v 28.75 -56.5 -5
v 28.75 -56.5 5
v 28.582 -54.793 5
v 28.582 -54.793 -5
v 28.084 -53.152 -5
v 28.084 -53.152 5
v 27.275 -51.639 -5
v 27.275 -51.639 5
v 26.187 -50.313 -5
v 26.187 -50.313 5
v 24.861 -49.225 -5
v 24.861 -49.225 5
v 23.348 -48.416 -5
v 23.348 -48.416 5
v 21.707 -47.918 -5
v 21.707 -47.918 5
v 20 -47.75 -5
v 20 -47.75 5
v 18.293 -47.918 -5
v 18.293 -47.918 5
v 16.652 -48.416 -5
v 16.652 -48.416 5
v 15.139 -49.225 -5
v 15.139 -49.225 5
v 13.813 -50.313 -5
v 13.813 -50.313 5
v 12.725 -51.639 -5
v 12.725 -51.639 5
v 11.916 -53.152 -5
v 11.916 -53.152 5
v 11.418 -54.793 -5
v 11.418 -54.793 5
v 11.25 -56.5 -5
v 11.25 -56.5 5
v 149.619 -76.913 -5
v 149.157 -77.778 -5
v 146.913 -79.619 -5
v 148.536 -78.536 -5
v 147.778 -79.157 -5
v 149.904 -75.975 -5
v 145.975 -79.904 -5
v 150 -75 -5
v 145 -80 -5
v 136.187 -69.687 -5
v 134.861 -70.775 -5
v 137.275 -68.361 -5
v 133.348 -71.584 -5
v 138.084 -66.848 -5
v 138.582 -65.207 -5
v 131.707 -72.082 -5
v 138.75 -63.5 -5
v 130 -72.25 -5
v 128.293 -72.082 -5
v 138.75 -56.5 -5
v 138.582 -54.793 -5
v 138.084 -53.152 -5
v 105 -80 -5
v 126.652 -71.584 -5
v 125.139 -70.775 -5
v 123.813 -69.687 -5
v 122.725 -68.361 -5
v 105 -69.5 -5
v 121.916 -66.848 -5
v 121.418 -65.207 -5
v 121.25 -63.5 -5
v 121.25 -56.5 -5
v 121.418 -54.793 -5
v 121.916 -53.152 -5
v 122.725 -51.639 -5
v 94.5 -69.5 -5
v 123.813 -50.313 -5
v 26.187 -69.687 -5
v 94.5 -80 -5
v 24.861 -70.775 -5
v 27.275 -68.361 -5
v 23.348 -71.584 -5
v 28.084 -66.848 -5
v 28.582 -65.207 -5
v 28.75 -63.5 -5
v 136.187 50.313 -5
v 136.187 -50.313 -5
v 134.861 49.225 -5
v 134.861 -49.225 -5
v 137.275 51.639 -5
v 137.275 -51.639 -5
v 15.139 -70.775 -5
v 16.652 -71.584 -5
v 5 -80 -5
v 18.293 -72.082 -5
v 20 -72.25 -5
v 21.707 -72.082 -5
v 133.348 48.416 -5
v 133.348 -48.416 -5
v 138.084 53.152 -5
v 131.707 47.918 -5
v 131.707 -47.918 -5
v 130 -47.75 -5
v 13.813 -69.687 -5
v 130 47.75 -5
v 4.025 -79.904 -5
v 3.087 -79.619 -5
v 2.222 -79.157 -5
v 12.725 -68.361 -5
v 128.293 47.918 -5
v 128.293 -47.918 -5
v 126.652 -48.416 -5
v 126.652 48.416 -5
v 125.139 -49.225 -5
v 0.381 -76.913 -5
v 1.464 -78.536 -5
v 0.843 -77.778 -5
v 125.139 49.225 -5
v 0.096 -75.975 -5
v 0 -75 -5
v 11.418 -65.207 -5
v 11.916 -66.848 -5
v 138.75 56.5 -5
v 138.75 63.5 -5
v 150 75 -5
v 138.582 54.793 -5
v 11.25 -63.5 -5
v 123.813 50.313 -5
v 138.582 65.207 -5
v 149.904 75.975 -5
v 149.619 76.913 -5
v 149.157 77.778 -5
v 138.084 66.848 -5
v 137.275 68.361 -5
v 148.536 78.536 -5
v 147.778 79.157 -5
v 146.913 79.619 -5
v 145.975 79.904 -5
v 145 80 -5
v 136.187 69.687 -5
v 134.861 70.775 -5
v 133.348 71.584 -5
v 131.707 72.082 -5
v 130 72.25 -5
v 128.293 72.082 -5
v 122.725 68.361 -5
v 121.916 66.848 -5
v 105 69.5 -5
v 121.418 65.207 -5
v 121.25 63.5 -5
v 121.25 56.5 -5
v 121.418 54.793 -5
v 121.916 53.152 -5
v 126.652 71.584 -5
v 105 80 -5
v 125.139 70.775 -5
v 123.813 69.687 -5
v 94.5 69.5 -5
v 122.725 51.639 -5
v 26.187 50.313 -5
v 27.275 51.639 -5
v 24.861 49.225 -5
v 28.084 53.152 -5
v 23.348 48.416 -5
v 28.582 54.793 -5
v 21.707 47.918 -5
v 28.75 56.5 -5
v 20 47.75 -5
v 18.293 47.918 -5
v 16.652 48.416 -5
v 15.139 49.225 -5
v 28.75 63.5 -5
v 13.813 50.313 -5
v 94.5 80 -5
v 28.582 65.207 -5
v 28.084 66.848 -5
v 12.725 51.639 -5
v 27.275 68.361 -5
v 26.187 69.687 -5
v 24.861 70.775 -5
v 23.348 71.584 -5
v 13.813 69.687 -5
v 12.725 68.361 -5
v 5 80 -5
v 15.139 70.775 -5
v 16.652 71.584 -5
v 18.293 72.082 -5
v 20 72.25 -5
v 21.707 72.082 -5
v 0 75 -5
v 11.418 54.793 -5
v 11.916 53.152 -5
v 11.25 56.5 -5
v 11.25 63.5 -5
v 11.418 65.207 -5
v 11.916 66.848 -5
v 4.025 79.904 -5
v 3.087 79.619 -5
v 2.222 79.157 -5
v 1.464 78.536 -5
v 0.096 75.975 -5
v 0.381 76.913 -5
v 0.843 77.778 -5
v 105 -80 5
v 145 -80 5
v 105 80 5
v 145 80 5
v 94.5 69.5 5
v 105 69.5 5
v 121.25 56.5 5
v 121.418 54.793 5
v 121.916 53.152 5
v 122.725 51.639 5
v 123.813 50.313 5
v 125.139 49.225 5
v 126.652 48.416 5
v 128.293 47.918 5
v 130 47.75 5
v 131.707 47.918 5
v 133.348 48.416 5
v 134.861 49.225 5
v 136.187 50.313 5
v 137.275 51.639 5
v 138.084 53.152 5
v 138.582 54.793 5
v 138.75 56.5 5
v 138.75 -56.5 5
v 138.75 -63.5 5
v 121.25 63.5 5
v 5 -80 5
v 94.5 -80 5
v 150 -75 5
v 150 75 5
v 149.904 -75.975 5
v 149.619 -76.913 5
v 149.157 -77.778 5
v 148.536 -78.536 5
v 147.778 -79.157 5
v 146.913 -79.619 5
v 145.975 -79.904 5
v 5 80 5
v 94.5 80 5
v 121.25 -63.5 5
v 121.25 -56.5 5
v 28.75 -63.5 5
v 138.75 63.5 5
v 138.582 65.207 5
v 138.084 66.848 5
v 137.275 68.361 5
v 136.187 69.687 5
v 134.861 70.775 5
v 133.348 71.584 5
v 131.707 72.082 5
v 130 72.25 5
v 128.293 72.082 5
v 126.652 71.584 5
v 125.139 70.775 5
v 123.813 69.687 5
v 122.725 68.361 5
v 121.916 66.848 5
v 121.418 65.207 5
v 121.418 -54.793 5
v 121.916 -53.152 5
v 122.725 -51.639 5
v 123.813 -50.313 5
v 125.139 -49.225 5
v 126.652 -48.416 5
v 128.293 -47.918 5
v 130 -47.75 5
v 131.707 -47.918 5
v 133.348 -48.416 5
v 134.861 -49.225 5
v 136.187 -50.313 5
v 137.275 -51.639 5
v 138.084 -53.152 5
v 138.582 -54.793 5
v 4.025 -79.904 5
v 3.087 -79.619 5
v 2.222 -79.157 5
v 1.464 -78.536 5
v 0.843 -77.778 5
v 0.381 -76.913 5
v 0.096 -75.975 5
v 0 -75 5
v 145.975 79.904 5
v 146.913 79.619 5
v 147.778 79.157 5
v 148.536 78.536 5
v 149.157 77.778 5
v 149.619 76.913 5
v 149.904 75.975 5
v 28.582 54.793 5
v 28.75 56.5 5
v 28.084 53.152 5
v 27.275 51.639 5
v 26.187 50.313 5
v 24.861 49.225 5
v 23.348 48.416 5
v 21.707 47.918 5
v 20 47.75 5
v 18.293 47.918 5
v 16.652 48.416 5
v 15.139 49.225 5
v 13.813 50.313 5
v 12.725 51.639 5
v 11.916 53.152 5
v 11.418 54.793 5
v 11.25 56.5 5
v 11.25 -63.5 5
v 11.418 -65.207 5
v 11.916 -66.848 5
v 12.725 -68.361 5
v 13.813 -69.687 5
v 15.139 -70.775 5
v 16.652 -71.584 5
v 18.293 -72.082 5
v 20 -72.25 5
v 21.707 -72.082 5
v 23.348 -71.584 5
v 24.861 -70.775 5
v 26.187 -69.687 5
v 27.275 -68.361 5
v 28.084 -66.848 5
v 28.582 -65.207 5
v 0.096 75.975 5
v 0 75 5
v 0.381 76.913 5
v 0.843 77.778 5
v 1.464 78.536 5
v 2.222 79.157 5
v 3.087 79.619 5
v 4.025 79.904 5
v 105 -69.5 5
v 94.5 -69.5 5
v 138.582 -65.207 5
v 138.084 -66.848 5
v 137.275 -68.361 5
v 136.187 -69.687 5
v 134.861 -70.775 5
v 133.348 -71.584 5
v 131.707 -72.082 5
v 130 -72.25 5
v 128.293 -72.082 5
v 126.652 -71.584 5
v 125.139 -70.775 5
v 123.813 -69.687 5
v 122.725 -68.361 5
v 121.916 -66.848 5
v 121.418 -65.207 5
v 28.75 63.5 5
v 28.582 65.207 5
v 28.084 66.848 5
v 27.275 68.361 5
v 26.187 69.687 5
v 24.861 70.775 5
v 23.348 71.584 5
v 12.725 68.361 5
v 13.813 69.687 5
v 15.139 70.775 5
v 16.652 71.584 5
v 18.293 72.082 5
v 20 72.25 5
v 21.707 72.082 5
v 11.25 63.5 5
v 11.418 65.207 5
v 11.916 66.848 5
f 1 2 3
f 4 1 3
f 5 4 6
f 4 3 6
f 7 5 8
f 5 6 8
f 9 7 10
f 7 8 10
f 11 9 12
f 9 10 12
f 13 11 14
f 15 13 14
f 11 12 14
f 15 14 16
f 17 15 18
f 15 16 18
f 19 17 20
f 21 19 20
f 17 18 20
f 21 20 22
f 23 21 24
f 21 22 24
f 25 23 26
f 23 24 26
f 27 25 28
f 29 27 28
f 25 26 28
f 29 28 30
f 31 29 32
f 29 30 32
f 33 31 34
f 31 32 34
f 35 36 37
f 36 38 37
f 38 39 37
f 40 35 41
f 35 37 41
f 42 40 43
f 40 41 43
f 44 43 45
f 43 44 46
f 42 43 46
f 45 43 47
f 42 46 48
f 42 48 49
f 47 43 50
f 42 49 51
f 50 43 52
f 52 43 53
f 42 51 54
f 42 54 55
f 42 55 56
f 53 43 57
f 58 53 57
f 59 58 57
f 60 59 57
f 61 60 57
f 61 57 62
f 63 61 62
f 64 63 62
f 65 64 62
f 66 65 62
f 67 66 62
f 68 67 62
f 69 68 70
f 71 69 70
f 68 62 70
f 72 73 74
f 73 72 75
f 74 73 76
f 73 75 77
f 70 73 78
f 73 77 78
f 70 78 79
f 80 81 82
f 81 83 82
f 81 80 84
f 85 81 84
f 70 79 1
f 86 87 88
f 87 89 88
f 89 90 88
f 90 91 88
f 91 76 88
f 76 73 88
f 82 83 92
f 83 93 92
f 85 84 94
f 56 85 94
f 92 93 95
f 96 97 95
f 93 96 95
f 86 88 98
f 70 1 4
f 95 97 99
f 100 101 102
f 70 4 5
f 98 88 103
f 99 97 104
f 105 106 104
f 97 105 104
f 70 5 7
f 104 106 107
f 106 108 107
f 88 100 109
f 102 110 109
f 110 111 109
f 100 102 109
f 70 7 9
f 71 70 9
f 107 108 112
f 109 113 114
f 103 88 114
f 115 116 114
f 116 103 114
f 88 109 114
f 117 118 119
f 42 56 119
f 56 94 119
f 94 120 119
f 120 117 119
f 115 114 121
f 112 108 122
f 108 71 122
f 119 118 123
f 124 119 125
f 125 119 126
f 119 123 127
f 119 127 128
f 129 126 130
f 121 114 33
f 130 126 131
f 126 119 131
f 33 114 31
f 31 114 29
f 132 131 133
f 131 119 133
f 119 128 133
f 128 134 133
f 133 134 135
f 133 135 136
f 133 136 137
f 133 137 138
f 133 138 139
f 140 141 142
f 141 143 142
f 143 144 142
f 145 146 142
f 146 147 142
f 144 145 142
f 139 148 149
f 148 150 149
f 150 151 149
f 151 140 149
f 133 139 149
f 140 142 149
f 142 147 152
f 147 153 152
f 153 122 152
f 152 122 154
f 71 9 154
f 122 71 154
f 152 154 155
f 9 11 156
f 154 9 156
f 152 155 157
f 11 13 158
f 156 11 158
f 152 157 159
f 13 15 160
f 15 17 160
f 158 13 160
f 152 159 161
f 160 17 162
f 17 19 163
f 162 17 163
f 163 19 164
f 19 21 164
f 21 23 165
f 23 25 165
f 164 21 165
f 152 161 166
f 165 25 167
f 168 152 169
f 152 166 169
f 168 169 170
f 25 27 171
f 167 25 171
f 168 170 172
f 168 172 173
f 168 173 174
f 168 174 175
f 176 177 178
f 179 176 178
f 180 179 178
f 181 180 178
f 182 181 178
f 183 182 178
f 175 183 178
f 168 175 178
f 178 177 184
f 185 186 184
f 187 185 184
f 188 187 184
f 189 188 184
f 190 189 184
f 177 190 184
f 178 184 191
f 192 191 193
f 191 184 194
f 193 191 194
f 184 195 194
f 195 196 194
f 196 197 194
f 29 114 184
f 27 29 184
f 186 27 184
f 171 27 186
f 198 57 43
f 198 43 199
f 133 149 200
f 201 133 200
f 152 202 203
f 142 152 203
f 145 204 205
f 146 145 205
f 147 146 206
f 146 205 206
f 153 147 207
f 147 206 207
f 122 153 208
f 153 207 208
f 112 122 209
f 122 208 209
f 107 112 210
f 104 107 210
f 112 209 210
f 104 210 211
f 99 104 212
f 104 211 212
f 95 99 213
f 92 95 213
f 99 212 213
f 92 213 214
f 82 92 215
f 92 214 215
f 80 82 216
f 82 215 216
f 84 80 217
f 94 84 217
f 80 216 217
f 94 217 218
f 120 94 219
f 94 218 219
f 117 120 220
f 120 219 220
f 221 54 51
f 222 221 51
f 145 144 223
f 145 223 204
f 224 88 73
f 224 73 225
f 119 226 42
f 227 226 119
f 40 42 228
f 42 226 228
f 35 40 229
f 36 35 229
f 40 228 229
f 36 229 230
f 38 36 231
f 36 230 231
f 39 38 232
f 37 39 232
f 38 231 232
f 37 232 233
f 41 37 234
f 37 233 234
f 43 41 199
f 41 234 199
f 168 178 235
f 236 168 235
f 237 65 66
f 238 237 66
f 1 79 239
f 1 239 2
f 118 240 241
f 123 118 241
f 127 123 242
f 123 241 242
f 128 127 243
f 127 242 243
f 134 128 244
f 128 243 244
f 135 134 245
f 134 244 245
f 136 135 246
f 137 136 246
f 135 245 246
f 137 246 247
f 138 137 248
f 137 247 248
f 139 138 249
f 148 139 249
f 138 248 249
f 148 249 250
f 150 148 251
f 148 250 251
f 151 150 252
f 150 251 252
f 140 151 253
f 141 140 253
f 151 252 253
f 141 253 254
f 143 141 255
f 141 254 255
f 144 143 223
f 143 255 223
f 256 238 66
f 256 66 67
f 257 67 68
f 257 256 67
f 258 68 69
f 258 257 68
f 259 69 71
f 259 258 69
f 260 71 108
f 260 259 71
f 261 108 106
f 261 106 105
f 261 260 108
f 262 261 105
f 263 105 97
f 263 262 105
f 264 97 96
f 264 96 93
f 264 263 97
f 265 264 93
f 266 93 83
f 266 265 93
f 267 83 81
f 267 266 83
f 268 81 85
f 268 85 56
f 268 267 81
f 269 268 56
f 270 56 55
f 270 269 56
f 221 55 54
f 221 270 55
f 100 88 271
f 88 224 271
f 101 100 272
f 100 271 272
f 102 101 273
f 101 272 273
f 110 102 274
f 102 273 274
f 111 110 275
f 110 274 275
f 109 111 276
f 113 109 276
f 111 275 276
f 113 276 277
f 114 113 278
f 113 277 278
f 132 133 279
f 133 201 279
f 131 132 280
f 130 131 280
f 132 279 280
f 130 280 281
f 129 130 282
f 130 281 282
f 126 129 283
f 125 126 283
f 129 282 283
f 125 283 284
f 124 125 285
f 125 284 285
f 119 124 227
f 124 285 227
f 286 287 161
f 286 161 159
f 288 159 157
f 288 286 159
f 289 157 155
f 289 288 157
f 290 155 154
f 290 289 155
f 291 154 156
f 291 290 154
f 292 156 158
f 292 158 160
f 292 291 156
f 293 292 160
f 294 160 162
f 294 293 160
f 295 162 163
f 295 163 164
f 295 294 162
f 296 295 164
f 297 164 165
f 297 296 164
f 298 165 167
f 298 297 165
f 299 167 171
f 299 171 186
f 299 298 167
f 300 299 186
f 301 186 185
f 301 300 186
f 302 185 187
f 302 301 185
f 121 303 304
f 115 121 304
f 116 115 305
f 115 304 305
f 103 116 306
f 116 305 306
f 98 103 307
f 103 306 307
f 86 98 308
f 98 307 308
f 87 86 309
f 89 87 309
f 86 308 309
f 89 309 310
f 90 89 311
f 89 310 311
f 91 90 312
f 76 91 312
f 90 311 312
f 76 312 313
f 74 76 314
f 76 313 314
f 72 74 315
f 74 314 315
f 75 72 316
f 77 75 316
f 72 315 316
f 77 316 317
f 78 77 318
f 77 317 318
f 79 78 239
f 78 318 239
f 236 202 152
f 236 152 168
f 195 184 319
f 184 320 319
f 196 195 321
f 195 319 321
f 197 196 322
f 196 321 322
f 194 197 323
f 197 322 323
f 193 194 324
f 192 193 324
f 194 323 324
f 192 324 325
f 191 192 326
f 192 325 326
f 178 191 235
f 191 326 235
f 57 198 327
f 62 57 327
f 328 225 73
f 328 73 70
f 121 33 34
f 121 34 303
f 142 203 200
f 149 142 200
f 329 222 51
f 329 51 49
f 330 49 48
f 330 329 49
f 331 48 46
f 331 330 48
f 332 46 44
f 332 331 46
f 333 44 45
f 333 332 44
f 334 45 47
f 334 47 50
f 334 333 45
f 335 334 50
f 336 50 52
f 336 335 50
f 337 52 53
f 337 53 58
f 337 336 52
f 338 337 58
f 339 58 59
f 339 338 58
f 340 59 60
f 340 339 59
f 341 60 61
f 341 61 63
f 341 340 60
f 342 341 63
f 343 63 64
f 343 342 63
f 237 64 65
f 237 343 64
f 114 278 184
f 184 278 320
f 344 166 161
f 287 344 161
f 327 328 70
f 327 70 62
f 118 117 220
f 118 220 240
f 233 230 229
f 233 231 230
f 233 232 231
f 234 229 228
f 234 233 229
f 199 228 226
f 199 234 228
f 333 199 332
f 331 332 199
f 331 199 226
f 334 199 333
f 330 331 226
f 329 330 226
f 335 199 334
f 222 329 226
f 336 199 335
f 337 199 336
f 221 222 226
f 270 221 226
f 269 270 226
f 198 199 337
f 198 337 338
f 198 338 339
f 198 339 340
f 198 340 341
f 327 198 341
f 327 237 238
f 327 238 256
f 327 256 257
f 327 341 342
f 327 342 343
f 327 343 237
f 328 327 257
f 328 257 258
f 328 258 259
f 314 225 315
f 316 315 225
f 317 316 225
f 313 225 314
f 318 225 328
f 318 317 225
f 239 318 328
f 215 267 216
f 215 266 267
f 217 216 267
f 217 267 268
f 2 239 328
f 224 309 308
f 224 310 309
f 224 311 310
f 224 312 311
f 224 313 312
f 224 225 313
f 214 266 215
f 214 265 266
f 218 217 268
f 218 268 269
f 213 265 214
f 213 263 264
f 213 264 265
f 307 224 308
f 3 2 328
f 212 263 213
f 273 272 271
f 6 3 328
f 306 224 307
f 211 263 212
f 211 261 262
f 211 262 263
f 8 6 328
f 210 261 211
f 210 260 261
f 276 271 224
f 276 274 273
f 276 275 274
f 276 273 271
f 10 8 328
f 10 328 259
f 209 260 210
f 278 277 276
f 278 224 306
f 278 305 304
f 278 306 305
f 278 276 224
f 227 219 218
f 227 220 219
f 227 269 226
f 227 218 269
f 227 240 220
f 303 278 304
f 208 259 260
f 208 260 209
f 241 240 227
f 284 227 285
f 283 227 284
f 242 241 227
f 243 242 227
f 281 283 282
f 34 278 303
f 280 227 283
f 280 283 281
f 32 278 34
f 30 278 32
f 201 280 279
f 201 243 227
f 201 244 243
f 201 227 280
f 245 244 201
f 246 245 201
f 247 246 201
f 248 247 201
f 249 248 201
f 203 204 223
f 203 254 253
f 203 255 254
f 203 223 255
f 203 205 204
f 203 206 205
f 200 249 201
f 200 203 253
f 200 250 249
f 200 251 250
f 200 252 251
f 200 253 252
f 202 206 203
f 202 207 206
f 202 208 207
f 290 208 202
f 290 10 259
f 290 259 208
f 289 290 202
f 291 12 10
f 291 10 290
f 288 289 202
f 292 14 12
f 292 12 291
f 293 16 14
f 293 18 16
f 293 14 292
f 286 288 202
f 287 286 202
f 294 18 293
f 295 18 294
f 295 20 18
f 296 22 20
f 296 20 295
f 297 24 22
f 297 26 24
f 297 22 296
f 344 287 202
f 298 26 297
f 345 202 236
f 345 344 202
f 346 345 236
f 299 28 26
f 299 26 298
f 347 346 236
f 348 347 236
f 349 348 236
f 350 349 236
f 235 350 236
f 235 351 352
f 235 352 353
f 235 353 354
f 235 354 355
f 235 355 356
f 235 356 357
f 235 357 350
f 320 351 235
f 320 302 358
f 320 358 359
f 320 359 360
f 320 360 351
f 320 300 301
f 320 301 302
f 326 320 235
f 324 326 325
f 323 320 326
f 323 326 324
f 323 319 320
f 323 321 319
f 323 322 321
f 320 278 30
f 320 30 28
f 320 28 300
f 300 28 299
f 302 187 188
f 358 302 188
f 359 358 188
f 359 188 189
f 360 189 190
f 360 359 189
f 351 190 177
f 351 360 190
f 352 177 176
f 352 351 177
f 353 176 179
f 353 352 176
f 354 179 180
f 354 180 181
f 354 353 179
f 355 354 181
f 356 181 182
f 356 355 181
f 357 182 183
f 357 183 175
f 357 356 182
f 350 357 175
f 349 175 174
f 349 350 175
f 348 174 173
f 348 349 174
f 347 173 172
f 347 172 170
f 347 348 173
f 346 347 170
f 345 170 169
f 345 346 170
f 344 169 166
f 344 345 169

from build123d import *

# Parameters (mm, degrees)
PLAT_W                      = 160
PLAT_H                      = 10
EL_MENT_M_CANO_SOUD_1_DEPTH = 150
D_GAGEMENT_M161_D           = 17.5
D_GAGEMENT_M161_DEPTH       = 10
D_GAGEMENT_M161_TIP         = 5.257530416
ESQUISSE4_W                 = 10.5
ESQUISSE4_H                 = 10.5
ENL_V_MAT_EXTRU_1_DEPTH     = 11
CONG_1_R                    = 5
ENL_V_MAT_EXTRU_2_DEPTH     = 10


with BuildPart() as part:
    # plat → Elément mécano-soudé1 (new body)
    with BuildSketch(Plane.YZ):
        Rectangle(PLAT_W, PLAT_H)
    extrude(amount=EL_MENT_M_CANO_SOUD_1_DEPTH)

    # Dégagement M161
    with Locations(Plane.XY.offset(5)):
        with Locations((130, -60), (130, 60), (20, 60), (20, -60)):
            Hole(D_GAGEMENT_M161_D / 2, depth=D_GAGEMENT_M161_DEPTH)
            with Locations((0, 0, -(D_GAGEMENT_M161_DEPTH + D_GAGEMENT_M161_TIP / 2))):  # 118° drill point
                Cone(0, D_GAGEMENT_M161_D / 2, D_GAGEMENT_M161_TIP, mode=Mode.SUBTRACT)

    # Esquisse4 → Enlèv. mat.-Extru.1 (cut, through all)
    with BuildSketch(Plane.XY.offset(5)):
        with Locations((99.75, 74.75)):
            Rectangle(ESQUISSE4_W, ESQUISSE4_H)
        with Locations((99.75, -74.75)):
            Rectangle(ESQUISSE4_W, ESQUISSE4_H)
    extrude(amount=-ENL_V_MAT_EXTRU_1_DEPTH, mode=Mode.SUBTRACT)

    # Congé1
    cong_1_edges = [part.edges().sort_by_distance(p)[0] for p in [
        (150, 80, 0),
        (150, -80, 0),
        (0, 80, 0),
        (0, -80, 0),
    ]]
    fillet(cong_1_edges, radius=CONG_1_R)

    # Esquisse5 → Enlèv. mat.-Extru.2 (cut)
    with BuildSketch(Plane.XY.offset(5)):
        with BuildLine():
            Line((11.25, 56.5), (11.25, 63.5))
            ThreePointArc((11.25, 63.5), (20, 72.25), (28.75, 63.5))
            Line((28.75, 63.5), (28.75, 56.5))
            ThreePointArc((28.75, 56.5), (20, 47.75), (11.25, 56.5))
        make_face()
        with BuildLine():
            Line((138.75, 56.5), (138.75, 63.5))
            ThreePointArc((138.75, 63.5), (130, 72.25), (121.25, 63.5))
            Line((121.25, 63.5), (121.25, 56.5))
            ThreePointArc((121.25, 56.5), (130, 47.75), (138.75, 56.5))
        make_face()
        with BuildLine():
            Line((138.75, -56.5), (138.75, -63.5))
            ThreePointArc((138.75, -63.5), (130, -72.25), (121.25, -63.5))
            Line((121.25, -63.5), (121.25, -56.5))
            ThreePointArc((121.25, -56.5), (130, -47.75), (138.75, -56.5))
        make_face()
        with BuildLine():
            Line((11.25, -56.5), (11.25, -63.5))
            ThreePointArc((11.25, -63.5), (20, -72.25), (28.75, -63.5))
            Line((28.75, -63.5), (28.75, -56.5))
            ThreePointArc((28.75, -56.5), (20, -47.75), (11.25, -56.5))
        make_face()
    extrude(amount=-ENL_V_MAT_EXTRU_2_DEPTH, mode=Mode.SUBTRACT)


solid = part.part
